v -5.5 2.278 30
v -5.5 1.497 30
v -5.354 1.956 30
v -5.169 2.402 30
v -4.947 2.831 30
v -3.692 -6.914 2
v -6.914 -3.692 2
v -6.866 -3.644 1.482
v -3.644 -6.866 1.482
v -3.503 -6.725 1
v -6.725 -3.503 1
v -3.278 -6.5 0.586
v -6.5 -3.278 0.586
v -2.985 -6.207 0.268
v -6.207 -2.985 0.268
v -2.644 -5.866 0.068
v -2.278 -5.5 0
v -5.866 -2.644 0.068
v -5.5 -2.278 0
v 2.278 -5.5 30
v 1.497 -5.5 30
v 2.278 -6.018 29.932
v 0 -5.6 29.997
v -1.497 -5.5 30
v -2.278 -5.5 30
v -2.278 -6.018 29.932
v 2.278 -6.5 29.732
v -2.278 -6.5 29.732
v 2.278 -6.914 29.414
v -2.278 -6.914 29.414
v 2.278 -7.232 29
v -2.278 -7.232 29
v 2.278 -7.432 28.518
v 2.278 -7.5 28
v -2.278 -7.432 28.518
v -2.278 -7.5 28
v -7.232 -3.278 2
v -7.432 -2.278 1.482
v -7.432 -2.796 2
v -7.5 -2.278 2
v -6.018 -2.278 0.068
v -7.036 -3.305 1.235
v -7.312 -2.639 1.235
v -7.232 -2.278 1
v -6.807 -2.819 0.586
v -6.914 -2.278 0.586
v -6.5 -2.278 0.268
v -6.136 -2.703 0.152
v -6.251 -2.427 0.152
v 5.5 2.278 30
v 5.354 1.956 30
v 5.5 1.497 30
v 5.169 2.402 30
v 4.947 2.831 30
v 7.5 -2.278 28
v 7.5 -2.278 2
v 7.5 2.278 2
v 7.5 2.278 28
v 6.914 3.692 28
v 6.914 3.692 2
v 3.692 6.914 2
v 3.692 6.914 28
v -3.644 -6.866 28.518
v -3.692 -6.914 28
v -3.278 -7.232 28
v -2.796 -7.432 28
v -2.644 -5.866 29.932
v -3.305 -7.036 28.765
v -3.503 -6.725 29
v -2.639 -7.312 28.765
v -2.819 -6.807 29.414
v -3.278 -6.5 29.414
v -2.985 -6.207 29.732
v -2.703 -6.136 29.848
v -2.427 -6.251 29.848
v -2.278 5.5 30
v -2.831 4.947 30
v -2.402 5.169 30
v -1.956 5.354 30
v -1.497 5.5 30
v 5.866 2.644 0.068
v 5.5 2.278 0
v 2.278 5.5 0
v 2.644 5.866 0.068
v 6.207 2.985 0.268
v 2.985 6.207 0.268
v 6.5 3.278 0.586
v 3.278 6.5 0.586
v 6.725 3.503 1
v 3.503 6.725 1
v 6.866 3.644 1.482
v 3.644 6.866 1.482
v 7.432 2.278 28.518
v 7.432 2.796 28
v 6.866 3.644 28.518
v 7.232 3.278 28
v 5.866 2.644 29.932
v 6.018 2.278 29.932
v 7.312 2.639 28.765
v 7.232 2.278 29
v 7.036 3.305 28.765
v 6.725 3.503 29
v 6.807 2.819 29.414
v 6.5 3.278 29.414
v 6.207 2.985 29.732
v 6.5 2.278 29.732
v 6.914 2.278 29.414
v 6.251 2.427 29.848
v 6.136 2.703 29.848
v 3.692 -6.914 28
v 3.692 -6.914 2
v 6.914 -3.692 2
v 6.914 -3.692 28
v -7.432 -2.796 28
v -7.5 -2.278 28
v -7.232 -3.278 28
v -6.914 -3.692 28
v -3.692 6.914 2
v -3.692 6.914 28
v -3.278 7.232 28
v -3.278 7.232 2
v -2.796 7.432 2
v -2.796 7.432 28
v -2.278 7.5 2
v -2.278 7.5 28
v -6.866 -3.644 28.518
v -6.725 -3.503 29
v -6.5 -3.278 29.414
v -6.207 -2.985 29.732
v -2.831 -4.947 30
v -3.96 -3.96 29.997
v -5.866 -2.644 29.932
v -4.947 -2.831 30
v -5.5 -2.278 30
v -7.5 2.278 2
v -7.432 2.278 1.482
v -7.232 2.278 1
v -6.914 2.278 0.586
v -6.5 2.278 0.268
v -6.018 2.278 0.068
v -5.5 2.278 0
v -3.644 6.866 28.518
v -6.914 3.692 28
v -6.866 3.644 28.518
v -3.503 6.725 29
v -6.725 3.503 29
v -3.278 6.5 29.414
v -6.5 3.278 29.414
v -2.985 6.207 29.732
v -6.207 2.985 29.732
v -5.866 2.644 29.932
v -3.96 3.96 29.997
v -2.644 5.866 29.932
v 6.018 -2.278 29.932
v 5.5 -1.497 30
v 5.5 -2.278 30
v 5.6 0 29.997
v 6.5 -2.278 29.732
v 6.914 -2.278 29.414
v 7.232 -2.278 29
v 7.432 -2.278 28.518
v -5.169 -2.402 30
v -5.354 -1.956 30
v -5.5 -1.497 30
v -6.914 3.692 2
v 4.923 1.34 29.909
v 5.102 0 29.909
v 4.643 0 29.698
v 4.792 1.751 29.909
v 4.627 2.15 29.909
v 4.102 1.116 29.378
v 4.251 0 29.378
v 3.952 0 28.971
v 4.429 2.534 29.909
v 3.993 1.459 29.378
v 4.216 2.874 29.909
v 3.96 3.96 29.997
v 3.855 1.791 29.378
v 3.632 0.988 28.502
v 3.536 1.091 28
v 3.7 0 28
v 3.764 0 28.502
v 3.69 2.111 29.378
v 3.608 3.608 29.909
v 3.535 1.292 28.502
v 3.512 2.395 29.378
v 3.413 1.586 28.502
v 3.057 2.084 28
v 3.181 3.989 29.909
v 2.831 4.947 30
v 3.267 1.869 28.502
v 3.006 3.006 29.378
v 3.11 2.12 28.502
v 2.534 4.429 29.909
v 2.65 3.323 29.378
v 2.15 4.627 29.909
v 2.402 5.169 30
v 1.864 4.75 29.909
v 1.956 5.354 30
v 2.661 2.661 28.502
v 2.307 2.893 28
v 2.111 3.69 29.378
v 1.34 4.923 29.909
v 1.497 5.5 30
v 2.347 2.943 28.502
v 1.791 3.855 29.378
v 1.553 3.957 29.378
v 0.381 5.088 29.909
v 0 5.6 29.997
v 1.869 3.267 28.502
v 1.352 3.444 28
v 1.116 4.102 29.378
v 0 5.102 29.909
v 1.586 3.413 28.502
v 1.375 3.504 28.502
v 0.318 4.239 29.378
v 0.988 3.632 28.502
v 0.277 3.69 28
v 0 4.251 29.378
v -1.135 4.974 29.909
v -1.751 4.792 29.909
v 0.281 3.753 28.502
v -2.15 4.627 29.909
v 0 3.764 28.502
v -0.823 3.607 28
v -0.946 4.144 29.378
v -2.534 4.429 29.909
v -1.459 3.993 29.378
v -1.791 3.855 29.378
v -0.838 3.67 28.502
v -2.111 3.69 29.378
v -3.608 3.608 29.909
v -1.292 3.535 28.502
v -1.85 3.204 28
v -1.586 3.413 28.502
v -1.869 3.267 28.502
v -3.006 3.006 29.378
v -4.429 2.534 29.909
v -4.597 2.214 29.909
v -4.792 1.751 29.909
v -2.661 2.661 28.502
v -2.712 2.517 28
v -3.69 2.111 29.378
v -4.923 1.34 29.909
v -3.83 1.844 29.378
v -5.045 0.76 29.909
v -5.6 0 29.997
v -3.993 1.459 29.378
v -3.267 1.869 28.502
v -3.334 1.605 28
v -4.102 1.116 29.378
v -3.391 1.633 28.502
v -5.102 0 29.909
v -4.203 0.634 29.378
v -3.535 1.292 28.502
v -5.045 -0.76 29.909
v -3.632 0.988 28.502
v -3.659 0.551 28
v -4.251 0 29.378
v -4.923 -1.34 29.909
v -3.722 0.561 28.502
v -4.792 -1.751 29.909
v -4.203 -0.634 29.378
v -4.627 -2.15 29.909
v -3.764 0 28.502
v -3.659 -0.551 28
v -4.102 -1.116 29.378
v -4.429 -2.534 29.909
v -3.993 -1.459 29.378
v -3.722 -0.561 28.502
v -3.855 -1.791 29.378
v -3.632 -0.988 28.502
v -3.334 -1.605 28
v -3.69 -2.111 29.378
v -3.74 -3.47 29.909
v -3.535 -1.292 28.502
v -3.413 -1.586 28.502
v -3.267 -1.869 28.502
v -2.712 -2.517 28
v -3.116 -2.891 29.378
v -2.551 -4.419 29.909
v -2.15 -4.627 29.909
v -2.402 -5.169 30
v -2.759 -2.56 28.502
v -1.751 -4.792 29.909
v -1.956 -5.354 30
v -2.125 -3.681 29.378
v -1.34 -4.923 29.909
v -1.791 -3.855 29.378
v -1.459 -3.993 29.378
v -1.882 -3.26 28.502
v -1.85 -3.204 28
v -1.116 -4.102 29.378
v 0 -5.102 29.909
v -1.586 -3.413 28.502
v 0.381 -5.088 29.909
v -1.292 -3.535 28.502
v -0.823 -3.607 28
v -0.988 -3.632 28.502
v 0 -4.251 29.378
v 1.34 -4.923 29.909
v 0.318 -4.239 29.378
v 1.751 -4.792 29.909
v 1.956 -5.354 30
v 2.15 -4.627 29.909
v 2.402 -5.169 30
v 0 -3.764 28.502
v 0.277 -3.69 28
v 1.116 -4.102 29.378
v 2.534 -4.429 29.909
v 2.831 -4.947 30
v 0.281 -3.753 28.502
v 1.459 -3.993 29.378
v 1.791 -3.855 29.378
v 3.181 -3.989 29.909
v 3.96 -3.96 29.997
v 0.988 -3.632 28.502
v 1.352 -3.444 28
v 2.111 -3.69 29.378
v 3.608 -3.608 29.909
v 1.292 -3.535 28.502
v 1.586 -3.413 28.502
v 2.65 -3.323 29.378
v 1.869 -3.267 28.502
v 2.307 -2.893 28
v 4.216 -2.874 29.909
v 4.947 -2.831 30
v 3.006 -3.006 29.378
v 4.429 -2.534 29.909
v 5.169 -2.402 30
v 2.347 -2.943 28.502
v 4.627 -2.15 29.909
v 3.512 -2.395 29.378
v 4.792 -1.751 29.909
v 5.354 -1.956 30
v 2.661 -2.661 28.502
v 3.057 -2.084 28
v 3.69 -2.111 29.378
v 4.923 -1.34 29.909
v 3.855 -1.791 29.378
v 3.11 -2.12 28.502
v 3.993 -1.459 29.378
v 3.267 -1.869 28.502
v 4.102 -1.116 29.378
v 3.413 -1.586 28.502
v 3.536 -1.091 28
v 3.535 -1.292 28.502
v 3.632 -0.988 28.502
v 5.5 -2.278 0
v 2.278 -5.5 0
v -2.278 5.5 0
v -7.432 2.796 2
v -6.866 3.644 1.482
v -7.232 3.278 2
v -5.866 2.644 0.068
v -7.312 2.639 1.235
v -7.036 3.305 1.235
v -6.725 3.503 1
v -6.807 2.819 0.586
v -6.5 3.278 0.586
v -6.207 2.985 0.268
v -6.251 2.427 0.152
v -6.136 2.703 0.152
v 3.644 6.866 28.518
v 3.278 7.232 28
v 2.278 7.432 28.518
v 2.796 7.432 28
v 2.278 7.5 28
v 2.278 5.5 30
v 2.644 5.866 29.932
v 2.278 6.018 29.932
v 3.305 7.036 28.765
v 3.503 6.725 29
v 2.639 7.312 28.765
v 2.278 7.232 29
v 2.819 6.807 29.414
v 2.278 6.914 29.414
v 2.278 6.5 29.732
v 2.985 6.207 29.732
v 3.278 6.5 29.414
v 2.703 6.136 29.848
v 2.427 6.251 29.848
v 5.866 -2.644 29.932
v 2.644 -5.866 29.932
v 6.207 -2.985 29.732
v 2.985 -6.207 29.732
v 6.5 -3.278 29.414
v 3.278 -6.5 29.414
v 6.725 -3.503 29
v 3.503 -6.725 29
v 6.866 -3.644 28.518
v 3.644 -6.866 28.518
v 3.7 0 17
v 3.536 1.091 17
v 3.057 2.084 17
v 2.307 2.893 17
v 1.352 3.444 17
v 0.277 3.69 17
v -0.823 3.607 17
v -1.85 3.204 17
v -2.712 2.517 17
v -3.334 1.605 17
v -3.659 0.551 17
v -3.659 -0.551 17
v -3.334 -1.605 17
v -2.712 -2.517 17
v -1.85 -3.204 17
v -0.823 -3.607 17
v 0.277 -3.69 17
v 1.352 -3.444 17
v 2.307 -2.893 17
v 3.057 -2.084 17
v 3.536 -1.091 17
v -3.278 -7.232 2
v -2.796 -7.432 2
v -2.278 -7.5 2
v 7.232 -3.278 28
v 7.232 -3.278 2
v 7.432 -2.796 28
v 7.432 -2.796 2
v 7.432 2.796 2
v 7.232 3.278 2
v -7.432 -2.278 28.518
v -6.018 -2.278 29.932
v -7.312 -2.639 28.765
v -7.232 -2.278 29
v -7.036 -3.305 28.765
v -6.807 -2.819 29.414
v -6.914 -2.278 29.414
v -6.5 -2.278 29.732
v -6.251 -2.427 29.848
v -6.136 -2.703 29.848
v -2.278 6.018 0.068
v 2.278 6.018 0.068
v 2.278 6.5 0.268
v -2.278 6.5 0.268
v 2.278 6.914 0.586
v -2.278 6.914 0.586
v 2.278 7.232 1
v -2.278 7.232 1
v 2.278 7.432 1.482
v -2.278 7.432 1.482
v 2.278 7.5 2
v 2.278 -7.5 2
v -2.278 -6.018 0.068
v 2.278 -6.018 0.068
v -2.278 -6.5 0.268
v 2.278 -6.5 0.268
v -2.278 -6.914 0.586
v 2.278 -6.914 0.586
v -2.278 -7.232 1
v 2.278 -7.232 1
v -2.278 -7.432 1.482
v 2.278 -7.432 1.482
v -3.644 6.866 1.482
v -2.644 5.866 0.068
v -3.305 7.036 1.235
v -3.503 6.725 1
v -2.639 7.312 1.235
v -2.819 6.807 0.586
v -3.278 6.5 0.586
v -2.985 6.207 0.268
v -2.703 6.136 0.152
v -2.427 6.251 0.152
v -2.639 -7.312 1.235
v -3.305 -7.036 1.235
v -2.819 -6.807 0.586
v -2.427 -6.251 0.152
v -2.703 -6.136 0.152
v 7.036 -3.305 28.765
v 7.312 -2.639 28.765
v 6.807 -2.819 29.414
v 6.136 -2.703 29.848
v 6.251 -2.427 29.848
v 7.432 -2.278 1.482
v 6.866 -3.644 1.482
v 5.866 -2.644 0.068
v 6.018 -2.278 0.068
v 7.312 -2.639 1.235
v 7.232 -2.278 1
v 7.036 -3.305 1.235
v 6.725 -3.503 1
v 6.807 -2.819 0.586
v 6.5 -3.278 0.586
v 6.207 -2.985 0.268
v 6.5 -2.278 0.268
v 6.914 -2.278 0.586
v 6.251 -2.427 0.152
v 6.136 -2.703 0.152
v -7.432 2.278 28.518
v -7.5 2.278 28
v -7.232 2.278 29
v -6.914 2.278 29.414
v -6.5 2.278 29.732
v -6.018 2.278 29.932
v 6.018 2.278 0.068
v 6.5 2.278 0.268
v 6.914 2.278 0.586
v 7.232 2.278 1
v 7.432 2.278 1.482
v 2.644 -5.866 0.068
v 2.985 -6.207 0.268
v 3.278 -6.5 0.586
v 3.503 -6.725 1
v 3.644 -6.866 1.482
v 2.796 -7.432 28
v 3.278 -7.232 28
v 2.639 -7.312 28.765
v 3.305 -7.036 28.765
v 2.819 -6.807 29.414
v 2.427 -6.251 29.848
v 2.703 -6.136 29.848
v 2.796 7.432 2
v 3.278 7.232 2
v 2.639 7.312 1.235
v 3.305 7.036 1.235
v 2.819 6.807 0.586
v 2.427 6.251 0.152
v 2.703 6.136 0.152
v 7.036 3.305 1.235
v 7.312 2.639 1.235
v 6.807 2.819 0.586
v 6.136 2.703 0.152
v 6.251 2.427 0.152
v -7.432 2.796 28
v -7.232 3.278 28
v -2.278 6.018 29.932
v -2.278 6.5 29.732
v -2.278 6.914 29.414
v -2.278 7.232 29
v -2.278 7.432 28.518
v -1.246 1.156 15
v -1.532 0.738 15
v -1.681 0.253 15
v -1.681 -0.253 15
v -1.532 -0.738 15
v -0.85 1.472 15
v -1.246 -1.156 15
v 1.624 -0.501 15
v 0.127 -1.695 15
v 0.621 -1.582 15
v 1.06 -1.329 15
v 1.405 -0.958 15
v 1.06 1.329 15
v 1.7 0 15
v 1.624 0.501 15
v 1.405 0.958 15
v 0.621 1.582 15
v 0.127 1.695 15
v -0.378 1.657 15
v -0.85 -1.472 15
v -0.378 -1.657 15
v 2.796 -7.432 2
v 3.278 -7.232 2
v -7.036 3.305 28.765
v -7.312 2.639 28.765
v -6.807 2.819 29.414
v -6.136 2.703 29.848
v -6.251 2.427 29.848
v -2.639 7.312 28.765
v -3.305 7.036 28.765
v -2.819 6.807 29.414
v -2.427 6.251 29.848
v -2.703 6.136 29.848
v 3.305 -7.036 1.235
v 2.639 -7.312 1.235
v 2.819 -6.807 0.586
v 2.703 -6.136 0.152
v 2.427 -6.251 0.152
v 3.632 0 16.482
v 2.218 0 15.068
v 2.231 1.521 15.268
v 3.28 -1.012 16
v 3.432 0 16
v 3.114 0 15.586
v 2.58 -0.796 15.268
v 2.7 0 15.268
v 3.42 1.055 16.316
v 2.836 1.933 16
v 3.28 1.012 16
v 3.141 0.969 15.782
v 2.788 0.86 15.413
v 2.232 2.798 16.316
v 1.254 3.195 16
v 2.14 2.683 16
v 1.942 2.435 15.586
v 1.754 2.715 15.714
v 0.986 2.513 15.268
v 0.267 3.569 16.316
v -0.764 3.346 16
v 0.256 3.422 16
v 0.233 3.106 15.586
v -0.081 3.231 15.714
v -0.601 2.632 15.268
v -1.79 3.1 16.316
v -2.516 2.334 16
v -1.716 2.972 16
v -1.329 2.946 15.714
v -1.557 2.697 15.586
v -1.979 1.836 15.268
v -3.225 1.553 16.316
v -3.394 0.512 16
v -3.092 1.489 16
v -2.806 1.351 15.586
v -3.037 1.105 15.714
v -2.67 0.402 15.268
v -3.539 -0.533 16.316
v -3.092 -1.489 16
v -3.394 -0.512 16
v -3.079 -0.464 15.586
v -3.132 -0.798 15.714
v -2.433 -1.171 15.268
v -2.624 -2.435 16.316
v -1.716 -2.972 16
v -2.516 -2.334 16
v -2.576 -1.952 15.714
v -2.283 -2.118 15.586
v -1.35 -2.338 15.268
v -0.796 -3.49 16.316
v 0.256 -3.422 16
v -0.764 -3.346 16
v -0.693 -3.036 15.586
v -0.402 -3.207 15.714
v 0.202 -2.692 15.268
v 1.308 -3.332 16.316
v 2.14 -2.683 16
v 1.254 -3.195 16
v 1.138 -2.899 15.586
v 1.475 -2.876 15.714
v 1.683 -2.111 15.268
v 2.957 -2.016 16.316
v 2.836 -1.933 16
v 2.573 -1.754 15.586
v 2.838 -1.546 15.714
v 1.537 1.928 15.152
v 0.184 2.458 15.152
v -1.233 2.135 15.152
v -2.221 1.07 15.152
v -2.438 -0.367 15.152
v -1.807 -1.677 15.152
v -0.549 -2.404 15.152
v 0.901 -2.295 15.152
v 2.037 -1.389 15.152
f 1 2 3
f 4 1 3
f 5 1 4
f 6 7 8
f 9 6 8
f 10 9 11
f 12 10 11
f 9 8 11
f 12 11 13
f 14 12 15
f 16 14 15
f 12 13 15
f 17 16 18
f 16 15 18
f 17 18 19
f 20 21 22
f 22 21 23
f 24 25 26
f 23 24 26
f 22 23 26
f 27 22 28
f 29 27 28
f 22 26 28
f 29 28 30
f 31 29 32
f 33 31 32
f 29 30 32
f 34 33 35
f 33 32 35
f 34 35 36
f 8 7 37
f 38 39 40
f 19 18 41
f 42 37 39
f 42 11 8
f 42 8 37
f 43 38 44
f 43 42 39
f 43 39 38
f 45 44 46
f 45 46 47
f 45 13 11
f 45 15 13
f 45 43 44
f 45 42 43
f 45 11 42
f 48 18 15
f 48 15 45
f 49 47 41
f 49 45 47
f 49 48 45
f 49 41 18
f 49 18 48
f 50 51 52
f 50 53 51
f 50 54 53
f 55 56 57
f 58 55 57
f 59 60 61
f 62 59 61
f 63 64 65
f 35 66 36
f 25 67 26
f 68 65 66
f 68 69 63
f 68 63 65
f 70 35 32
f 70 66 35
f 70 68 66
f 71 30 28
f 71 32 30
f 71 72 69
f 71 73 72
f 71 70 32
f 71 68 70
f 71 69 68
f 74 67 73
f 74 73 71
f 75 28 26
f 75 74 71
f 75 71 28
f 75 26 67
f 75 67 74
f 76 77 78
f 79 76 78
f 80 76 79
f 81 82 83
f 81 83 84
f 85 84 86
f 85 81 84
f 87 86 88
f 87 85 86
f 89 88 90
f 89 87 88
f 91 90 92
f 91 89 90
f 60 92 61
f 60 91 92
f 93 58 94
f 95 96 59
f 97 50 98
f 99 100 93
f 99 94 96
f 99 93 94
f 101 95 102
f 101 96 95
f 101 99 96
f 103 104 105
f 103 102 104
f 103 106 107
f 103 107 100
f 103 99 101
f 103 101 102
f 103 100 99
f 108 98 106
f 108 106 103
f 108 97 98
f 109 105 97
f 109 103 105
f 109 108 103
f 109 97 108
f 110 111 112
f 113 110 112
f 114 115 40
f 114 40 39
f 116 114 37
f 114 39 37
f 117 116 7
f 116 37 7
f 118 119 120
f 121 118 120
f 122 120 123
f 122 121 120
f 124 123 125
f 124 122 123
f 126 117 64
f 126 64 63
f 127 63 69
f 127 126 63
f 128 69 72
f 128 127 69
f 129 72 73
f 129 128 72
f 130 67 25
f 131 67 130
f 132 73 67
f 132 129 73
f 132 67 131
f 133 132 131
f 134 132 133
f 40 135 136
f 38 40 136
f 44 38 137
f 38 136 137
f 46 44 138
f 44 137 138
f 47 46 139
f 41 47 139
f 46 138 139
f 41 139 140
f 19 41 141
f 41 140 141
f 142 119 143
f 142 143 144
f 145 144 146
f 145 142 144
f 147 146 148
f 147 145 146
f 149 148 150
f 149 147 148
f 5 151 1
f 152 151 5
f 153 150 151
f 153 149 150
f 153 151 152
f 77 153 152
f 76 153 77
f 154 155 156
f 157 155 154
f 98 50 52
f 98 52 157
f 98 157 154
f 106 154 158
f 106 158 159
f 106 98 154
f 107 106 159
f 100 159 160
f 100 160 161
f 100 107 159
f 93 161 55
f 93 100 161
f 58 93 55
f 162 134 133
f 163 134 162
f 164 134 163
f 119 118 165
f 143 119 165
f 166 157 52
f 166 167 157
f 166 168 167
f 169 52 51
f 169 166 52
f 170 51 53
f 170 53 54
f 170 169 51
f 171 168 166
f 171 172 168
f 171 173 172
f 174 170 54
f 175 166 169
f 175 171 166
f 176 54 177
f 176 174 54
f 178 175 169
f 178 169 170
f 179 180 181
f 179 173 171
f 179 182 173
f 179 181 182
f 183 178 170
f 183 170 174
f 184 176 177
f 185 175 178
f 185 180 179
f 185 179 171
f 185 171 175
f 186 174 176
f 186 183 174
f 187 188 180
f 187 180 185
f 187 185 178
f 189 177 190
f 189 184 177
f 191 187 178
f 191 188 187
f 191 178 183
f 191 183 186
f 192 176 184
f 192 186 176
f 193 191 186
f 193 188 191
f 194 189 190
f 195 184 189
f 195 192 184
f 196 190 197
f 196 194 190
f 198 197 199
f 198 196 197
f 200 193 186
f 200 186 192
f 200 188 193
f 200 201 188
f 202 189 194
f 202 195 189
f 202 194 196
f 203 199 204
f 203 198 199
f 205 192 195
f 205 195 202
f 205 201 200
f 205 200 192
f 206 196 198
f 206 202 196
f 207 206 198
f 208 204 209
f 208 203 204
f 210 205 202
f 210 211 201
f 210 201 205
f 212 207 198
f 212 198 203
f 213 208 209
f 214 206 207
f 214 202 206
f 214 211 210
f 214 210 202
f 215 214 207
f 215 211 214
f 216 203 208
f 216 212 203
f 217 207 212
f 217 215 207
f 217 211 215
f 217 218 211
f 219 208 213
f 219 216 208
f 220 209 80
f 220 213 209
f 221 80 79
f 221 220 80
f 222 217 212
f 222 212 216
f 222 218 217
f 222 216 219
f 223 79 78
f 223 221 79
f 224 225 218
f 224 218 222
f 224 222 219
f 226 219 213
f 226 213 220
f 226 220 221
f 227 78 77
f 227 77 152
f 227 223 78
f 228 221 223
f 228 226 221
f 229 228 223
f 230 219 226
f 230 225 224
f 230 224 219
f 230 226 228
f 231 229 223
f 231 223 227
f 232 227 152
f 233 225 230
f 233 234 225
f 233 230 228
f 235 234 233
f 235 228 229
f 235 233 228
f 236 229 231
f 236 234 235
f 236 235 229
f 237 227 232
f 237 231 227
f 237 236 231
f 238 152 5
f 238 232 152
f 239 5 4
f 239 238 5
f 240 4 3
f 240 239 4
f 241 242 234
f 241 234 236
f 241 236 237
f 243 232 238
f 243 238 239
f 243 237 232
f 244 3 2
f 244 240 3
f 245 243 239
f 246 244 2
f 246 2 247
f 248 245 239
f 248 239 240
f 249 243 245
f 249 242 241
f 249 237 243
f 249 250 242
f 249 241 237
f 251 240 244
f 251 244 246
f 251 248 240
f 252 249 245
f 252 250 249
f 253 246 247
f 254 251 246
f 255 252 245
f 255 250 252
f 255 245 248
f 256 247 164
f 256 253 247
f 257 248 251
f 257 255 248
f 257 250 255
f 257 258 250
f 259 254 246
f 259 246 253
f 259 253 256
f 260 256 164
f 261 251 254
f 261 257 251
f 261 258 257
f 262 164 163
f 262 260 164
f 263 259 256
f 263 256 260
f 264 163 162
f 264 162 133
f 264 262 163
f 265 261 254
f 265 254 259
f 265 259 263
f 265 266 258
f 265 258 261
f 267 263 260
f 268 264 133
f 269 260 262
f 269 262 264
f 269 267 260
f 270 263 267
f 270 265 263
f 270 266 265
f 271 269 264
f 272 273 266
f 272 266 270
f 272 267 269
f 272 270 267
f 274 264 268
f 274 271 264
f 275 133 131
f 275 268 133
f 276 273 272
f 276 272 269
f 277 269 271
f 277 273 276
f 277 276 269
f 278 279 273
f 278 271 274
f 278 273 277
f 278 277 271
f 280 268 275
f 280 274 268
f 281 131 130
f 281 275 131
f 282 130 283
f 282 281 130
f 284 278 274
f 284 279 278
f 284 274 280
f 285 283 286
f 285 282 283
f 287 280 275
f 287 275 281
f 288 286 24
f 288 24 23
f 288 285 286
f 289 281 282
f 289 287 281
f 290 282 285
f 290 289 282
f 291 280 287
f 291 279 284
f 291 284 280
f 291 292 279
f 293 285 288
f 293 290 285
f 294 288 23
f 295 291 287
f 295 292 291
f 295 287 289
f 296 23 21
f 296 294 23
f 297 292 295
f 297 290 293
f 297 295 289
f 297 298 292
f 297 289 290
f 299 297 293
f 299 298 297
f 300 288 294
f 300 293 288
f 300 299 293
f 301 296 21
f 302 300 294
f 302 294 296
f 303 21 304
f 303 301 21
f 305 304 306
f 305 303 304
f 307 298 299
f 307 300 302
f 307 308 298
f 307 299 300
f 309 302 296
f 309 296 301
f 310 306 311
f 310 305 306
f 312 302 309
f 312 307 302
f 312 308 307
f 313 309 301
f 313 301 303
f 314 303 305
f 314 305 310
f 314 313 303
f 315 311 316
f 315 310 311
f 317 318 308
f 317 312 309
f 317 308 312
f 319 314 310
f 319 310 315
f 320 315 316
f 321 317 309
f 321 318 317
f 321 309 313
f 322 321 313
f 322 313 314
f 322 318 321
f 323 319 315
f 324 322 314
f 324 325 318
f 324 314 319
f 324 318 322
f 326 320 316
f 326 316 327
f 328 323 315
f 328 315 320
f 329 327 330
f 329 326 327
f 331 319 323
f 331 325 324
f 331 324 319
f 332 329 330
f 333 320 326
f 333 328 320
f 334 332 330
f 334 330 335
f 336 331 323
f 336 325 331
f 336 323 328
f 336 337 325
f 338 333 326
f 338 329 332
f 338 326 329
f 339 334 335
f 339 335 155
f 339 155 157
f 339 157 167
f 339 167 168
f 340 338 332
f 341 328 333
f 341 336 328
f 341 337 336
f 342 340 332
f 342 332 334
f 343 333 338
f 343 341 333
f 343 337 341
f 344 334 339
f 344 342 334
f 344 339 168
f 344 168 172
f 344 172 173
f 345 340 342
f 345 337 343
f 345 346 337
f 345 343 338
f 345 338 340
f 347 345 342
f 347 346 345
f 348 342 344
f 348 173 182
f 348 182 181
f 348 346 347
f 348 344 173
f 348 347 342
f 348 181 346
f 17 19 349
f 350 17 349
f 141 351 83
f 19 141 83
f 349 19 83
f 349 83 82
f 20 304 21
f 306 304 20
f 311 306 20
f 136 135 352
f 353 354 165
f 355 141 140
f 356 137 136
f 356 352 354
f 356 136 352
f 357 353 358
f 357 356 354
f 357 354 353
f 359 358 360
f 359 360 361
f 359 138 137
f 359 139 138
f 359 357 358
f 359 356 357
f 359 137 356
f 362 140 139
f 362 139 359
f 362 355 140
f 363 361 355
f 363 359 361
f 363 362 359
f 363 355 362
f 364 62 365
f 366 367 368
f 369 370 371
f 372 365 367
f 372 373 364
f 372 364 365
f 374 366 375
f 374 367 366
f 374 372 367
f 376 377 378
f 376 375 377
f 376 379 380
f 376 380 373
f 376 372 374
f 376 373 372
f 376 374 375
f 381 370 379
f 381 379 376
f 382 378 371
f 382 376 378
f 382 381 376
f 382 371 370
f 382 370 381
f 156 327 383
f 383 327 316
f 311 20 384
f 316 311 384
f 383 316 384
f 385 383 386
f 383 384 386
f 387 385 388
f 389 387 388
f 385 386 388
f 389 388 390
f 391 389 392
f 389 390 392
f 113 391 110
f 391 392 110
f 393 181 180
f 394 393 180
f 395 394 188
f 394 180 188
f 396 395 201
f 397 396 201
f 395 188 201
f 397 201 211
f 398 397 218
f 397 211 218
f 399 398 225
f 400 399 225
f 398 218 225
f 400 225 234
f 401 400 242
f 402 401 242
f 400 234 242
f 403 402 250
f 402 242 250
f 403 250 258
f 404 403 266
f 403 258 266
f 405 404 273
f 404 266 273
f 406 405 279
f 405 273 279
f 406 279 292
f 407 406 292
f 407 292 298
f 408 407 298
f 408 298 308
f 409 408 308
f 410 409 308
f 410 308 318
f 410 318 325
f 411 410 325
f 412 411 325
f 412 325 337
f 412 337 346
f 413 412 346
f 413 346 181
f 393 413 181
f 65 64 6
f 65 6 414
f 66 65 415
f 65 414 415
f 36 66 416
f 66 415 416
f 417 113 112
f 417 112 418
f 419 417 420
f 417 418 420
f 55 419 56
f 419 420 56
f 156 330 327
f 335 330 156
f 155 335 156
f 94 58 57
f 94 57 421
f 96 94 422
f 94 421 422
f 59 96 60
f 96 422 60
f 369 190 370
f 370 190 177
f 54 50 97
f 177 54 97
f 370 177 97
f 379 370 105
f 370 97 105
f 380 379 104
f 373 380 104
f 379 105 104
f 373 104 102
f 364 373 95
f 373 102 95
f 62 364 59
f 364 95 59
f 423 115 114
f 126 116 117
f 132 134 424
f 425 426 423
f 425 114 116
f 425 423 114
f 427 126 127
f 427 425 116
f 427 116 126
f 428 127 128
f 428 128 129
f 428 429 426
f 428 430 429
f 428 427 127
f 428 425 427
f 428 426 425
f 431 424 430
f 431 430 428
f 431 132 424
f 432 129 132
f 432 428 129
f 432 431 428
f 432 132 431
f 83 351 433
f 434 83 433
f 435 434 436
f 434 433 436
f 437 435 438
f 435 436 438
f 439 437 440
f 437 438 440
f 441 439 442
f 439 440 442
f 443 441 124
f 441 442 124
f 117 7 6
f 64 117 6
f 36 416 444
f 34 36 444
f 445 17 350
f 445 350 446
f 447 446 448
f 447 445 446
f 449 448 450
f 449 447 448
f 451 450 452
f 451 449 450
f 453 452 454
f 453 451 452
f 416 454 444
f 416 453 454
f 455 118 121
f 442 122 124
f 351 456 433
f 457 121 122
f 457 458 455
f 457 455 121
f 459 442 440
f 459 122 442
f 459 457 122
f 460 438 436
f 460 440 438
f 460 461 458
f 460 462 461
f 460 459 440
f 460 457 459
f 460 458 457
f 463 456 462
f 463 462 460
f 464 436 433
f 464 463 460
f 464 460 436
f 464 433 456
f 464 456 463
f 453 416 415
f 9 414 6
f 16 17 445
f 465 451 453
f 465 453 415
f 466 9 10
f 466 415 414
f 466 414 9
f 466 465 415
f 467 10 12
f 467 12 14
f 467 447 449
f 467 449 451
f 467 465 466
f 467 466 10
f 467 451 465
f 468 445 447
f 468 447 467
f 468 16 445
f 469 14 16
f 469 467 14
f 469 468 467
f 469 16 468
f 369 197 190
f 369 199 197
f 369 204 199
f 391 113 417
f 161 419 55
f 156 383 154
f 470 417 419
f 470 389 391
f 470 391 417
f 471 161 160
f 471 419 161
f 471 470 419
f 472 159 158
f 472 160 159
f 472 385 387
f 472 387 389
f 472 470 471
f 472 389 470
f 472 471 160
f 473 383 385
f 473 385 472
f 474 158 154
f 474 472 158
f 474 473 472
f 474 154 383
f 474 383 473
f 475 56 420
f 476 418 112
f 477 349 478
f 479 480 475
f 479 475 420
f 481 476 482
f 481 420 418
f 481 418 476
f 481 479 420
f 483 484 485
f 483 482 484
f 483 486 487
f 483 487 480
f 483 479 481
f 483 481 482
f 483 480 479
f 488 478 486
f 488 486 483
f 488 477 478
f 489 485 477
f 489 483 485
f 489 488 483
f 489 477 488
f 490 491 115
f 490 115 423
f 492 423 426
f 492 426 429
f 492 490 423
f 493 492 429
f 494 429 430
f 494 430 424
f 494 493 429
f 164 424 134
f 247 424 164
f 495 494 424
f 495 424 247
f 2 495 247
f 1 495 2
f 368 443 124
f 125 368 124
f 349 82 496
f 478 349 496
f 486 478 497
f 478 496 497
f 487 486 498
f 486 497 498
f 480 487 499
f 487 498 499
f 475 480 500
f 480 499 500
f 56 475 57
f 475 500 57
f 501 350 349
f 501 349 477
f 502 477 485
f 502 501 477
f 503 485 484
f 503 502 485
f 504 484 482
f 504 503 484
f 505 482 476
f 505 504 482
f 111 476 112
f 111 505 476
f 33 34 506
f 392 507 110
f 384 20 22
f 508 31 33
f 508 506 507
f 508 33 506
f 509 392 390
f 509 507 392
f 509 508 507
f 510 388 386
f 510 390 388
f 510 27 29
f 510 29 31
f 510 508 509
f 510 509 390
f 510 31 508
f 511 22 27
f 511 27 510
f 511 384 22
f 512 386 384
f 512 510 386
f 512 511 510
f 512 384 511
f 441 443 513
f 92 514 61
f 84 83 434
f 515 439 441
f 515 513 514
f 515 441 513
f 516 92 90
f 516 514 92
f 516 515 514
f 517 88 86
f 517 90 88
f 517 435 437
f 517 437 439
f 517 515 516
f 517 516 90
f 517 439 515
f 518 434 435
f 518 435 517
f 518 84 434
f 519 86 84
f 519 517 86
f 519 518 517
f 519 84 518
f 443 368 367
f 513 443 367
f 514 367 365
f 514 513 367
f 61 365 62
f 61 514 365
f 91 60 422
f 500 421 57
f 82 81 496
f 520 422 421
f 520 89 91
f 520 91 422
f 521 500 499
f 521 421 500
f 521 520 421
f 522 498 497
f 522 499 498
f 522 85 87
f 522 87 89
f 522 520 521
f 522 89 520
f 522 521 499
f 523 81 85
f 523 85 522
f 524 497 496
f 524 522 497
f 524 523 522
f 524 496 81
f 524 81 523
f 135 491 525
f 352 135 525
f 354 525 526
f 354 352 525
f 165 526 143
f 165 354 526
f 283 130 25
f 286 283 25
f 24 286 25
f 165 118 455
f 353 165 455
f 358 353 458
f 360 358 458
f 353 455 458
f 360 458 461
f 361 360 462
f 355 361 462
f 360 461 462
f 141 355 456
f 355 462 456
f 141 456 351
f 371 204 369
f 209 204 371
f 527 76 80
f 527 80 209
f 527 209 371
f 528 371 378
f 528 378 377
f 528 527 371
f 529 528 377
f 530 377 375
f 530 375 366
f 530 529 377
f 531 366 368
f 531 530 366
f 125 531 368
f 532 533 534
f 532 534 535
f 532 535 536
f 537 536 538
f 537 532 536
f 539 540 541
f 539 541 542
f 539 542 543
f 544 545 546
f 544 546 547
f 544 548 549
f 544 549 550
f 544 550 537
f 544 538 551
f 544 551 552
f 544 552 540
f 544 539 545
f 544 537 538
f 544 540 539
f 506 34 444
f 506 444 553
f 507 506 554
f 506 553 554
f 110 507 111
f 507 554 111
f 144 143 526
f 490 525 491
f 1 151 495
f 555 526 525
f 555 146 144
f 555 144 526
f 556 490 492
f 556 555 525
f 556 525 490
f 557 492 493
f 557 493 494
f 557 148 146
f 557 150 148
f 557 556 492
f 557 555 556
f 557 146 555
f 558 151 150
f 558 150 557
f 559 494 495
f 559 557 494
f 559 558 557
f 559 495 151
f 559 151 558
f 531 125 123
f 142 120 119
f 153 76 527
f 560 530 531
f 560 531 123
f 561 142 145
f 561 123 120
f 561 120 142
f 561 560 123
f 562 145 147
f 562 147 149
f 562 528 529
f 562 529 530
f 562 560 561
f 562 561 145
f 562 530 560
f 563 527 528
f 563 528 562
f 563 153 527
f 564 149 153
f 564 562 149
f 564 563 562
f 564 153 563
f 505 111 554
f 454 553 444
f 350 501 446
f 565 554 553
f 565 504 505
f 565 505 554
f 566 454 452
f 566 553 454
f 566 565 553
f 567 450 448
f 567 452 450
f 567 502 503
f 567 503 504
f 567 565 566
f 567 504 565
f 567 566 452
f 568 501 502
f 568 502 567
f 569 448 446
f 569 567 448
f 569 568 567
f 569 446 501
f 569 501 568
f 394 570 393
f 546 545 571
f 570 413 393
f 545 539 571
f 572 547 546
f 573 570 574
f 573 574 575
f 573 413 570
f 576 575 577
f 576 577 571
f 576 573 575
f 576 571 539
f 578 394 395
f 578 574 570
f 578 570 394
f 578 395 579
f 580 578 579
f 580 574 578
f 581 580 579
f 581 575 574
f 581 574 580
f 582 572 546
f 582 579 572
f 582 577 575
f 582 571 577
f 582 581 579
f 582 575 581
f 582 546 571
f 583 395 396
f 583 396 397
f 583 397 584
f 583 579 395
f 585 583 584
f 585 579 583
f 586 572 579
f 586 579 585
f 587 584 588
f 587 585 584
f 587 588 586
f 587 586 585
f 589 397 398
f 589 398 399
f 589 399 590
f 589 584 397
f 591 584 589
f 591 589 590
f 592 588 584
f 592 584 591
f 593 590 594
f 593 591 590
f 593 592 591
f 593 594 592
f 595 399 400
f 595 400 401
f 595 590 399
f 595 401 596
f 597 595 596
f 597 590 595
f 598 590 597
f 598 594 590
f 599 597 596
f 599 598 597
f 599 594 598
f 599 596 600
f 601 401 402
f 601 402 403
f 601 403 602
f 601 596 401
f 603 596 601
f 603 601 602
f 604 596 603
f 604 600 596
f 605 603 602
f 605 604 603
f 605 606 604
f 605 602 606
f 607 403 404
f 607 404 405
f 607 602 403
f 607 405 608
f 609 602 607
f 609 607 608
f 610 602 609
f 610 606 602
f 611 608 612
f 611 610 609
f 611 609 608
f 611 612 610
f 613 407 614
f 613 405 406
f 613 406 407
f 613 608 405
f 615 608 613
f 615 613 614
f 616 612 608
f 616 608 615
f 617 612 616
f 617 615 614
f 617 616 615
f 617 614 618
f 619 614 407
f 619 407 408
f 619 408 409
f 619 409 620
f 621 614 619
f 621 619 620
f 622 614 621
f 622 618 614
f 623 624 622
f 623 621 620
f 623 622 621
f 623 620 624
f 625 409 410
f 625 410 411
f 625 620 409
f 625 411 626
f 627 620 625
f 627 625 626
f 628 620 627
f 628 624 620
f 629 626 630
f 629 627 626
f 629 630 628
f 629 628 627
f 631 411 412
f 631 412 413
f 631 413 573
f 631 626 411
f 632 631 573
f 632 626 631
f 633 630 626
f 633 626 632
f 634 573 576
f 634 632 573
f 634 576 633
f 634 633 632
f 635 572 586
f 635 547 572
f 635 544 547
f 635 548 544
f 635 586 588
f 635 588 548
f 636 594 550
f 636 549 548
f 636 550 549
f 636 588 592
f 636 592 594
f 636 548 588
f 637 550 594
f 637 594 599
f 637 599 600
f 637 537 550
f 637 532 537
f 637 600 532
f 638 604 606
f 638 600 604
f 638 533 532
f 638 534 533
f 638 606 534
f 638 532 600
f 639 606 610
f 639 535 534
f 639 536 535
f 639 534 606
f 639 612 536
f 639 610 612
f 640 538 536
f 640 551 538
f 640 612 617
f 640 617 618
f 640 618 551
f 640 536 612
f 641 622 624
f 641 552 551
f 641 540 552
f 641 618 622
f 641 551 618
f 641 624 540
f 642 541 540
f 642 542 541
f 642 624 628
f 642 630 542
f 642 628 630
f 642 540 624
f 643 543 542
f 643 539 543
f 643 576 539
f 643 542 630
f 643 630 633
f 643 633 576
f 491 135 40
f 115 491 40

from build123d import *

# Parameters (mm, degrees)
F1_DEPTH      = 30
F2_R          = 3.7
F3_DEPTH      = 15
F4_T3_DEPTH   = 4.5563491861
F4_T5_DEPTH   = 26
F4_T7_DEPTH   = 4.5563491861
F4_T9_DEPTH   = 4.5563491861
F4_T11_DEPTH  = 4.5563491861
F4_T13_DEPTH  = 4.5563491861
F4_T15_DEPTH  = 4.5563491861
F4_T20_DEPTH  = 2
F4_T26_DEPTH  = 2
F4_T32_DEPTH  = 2
F4_T38_DEPTH  = 2
F4_T44_DEPTH  = 2
F4_T50_DEPTH  = 2
F4_T56_DEPTH  = 2
F4_T62_DEPTH  = 2
F4_T68_DEPTH  = 2
F4_T74_DEPTH  = 2
F4_T80_DEPTH  = 2
F4_T86_DEPTH  = 2
F4_T92_DEPTH  = 2
F4_T98_DEPTH  = 2
F4_T104_DEPTH = 2
F4_T110_DEPTH = 2


# Not quite as in the source:
# - a fillet or chamfer that OpenCascade refuses, or shapes differently, is made with other operations: its cross-section is extruded or revolved along the edge and cut away or added


with BuildPart() as f1:
    # F0 (on Top) → F1 (new body)
    with BuildSketch(Plane.XY):
        Polygon((-7.5, 3.1066017178), (-7.5, -3.1066017178), (-3.1066017178, -7.5), (3.1066017178, -7.5), (7.5, -3.1066017178), (7.5, 3.1066017178), (3.1066017178, 7.5), (-3.1066017178, 7.5), align=None)
    extrude(amount=F1_DEPTH)

    # F2 (on face) → F3 (cut)
    with BuildSketch(Plane.XY.offset(30)):
        Circle(F2_R)
    extrude(amount=-F3_DEPTH, mode=Mode.SUBTRACT)

    # F4: fillet of radius 2 on 26 edges, made by hand

    # F4_s1 → F4_t2 (revolve)
    with BuildSketch(Plane.XZ):
        with BuildLine():
            ThreePointArc((3.7, 17), (3.1142135624, 15.5857864376), (1.7, 15))
            Line((1.7, 15), (3.7, 15))
            Line((3.7, 15), (3.7, 17))
        make_face()
    revolve(axis=Axis((0, 0, 15), (0, 0, 1)))

    # F4_s4 → F4_t3 (cut)
    with BuildSketch(Plane(origin=(-1.6109127035, -1.6109127035, 0), x_dir=(0, 0, 1), z_dir=(0.7071067812, 0.7071067812, 0))):
        with BuildLine():
            ThreePointArc((0, 5.5), (0.5857864376, 6.9142135624), (2, 7.5))
            Line((2, 7.5), (0, 7.5))
            Line((0, 7.5), (0, 5.5))
        make_face()
        with BuildLine():
            ThreePointArc((30, 5.5), (29.4142135624, 6.9142135624), (28, 7.5))
            Line((28, 7.5), (30, 7.5))
            Line((30, 7.5), (30, 5.5))
        make_face()
    extrude(amount=F4_T3_DEPTH, mode=Mode.SUBTRACT)

    # F4_s6 → F4_t5 (cut)
    with BuildSketch(Plane.XY.offset(2)):
        with BuildLine():
            ThreePointArc((6.9142135624, -3.6923881554), (7.347759065, -3.0435414578), (7.5, -2.2781745931))
            Line((7.5, -2.2781745931), (7.5, -3.1066017178))
            Line((7.5, -3.1066017178), (6.9142135624, -3.6923881554))
        make_face()
        with BuildLine():
            ThreePointArc((7.5, 2.2781745931), (7.347759065, 3.0435414578), (6.9142135624, 3.6923881554))
            Line((6.9142135624, 3.6923881554), (7.5, 3.1066017178))
            Line((7.5, 3.1066017178), (7.5, 2.2781745931))
        make_face()
        with BuildLine():
            ThreePointArc((-7.5, 2.2781745931), (-7.347759065, 3.0435414578), (-6.9142135624, 3.6923881554))
            Line((-6.9142135624, 3.6923881554), (-7.5, 3.1066017178))
            Line((-7.5, 3.1066017178), (-7.5, 2.2781745931))
        make_face()
        with BuildLine():
            ThreePointArc((-3.6923881554, 6.9142135624), (-3.0435414578, 7.347759065), (-2.2781745931, 7.5))
            Line((-2.2781745931, 7.5), (-3.1066017178, 7.5))
            Line((-3.1066017178, 7.5), (-3.6923881554, 6.9142135624))
        make_face()
        with BuildLine():
            ThreePointArc((-3.6923881554, -6.9142135624), (-3.0435414578, -7.347759065), (-2.2781745931, -7.5))
            Line((-2.2781745931, -7.5), (-3.1066017178, -7.5))
            Line((-3.1066017178, -7.5), (-3.6923881554, -6.9142135624))
        make_face()
        with BuildLine():
            ThreePointArc((-7.5, -2.2781745931), (-7.347759065, -3.0435414578), (-6.9142135624, -3.6923881554))
            Line((-6.9142135624, -3.6923881554), (-7.5, -3.1066017178))
            Line((-7.5, -3.1066017178), (-7.5, -2.2781745931))
        make_face()
        with BuildLine():
            ThreePointArc((2.2781745931, -7.5), (3.0435414578, -7.347759065), (3.6923881554, -6.9142135624))
            Line((3.6923881554, -6.9142135624), (3.1066017178, -7.5))
            Line((3.1066017178, -7.5), (2.2781745931, -7.5))
        make_face()
        with BuildLine():
            ThreePointArc((2.2781745931, 7.5), (3.0435414578, 7.347759065), (3.6923881554, 6.9142135624))
            Line((3.6923881554, 6.9142135624), (3.1066017178, 7.5))
            Line((3.1066017178, 7.5), (2.2781745931, 7.5))
        make_face()
    extrude(amount=F4_T5_DEPTH, mode=Mode.SUBTRACT)

    # F4_s8 → F4_t7 (cut)
    with BuildSketch(Plane.YZ.offset(-2.2781745931)):
        with BuildLine():
            ThreePointArc((-5.5, 0), (-6.9142135624, 0.5857864376), (-7.5, 2))
            Line((-7.5, 2), (-7.5, 0))
            Line((-7.5, 0), (-5.5, 0))
        make_face()
        with BuildLine():
            ThreePointArc((5.5, 0), (6.9142135624, 0.5857864376), (7.5, 2))
            Line((7.5, 2), (7.5, 0))
            Line((7.5, 0), (5.5, 0))
        make_face()
        with BuildLine():
            ThreePointArc((-5.5, 30), (-6.9142135624, 29.4142135624), (-7.5, 28))
            Line((-7.5, 28), (-7.5, 30))
            Line((-7.5, 30), (-5.5, 30))
        make_face()
        with BuildLine():
            ThreePointArc((5.5, 30), (6.9142135624, 29.4142135624), (7.5, 28))
            Line((7.5, 28), (7.5, 30))
            Line((7.5, 30), (5.5, 30))
        make_face()
    extrude(amount=F4_T7_DEPTH, mode=Mode.SUBTRACT)

    # F4_s10 → F4_t9 (cut)
    with BuildSketch(Plane.XZ.offset(-2.2781745931)):
        with BuildLine():
            ThreePointArc((5.5, 30), (6.9142135624, 29.4142135624), (7.5, 28))
            Line((7.5, 28), (7.5, 30))
            Line((7.5, 30), (5.5, 30))
        make_face()
        with BuildLine():
            ThreePointArc((5.5, 0), (6.9142135624, 0.5857864376), (7.5, 2))
            Line((7.5, 2), (7.5, 0))
            Line((7.5, 0), (5.5, 0))
        make_face()
        with BuildLine():
            ThreePointArc((-7.5, 2), (-6.9142135624, 0.5857864376), (-5.5, 0))
            Line((-5.5, 0), (-7.5, 0))
            Line((-7.5, 0), (-7.5, 2))
        make_face()
        with BuildLine():
            ThreePointArc((-7.5, 28), (-6.9142135624, 29.4142135624), (-5.5, 30))
            Line((-5.5, 30), (-7.5, 30))
            Line((-7.5, 30), (-7.5, 28))
        make_face()
    extrude(amount=F4_T9_DEPTH, mode=Mode.SUBTRACT)

    # F4_s12 → F4_t11 (cut)
    with BuildSketch(Plane(origin=(1.6109127035, -1.6109127035, 0), x_dir=(0, 0, 1), z_dir=(-0.7071067812, 0.7071067812, 0))):
        with BuildLine():
            ThreePointArc((0, 5.5), (0.5857864376, 6.9142135624), (2, 7.5))
            Line((2, 7.5), (0, 7.5))
            Line((0, 7.5), (0, 5.5))
        make_face()
        with BuildLine():
            ThreePointArc((30, 5.5), (29.4142135624, 6.9142135624), (28, 7.5))
            Line((28, 7.5), (30, 7.5))
            Line((30, 7.5), (30, 5.5))
        make_face()
    extrude(amount=F4_T11_DEPTH, mode=Mode.SUBTRACT)

    # F4_s14 → F4_t13 (cut)
    with BuildSketch(Plane(origin=(-1.6109127035, 1.6109127035, 0), x_dir=(0, 0, 1), z_dir=(0.7071067812, -0.7071067812, 0))):
        with BuildLine():
            ThreePointArc((2, 7.5), (0.5857864376, 6.9142135624), (0, 5.5))
            Line((0, 5.5), (0, 7.5))
            Line((0, 7.5), (2, 7.5))
        make_face()
        with BuildLine():
            ThreePointArc((28, 7.5), (29.4142135624, 6.9142135624), (30, 5.5))
            Line((30, 5.5), (30, 7.5))
            Line((30, 7.5), (28, 7.5))
        make_face()
    extrude(amount=F4_T13_DEPTH, mode=Mode.SUBTRACT)

    # F4_s16 → F4_t15 (cut)
    with BuildSketch(Plane(origin=(1.6109127035, 1.6109127035, 0), x_dir=(0, 0, 1), z_dir=(-0.7071067812, -0.7071067812, 0))):
        with BuildLine():
            ThreePointArc((28, 7.5), (29.4142135624, 6.9142135624), (30, 5.5))
            Line((30, 5.5), (30, 7.5))
            Line((30, 7.5), (28, 7.5))
        make_face()
        with BuildLine():
            ThreePointArc((2, 7.5), (0.5857864376, 6.9142135624), (0, 5.5))
            Line((0, 5.5), (0, 7.5))
            Line((0, 7.5), (2, 7.5))
        make_face()
    extrude(amount=F4_T15_DEPTH, mode=Mode.SUBTRACT)


with BuildPart() as f4_tool18:
    # F4_s19 → F4_t20 (new body)
    with BuildSketch(Plane.XY.offset(2)):
        Polygon((2.2781745931, -5.5), (2.2781745931, -7.5), (3.1066017178, -7.5), (3.6923881554, -6.9142135624), align=None)
    extrude(amount=-F4_T20_DEPTH)

    # F4_s21 → F4_t22 (revolve, cut)
    with BuildSketch(Plane(origin=(2.2781745931, -5.5, 2), x_dir=(-0.3826834324, 0.9238795325, 0), z_dir=(-0.9238795325, -0.3826834324, 0))):
        with BuildLine():
            ThreePointArc((0, -2), (2, 0), (0, 2))
            Line((0, 2), (0, -2))
        make_face()
    revolve(axis=Axis((2.2781745931, -5.5, 2), (0, 0, -1)), mode=Mode.SUBTRACT)


with BuildPart() as f1_1:
    add(f1.part)

    # F4_t17: cut F4_tool18
    add(f4_tool18.part, mode=Mode.SUBTRACT)


with BuildPart() as f4_tool24:
    # F4_s25 → F4_t26 (new body)
    with BuildSketch(Plane.XY.offset(2)):
        Polygon((5.5, -2.2781745931), (6.9142135624, -3.6923881554), (7.5, -3.1066017178), (7.5, -2.2781745931), align=None)
    extrude(amount=-F4_T26_DEPTH)

    # F4_s27 → F4_t28 (revolve, cut)
    with BuildSketch(Plane(origin=(5.5, -2.2781745931, 2), x_dir=(-0.9238795325, 0.3826834324, 0), z_dir=(-0.3826834324, -0.9238795325, 0))):
        with BuildLine():
            ThreePointArc((0, -2), (2, 0), (0, 2))
            Line((0, 2), (0, -2))
        make_face()
    revolve(axis=Axis((5.5, -2.2781745931, 2), (0, 0, -1)), mode=Mode.SUBTRACT)


with BuildPart() as f1_2:
    add(f1_1.part)

    # F4_t23: cut F4_tool24
    add(f4_tool24.part, mode=Mode.SUBTRACT)


with BuildPart() as f4_tool30:
    # F4_s31 → F4_t32 (new body)
    with BuildSketch(Plane.XY.offset(28)):
        Polygon((5.5, -2.2781745931), (6.9142135624, -3.6923881554), (7.5, -3.1066017178), (7.5, -2.2781745931), align=None)
    extrude(amount=F4_T32_DEPTH)

    # F4_s33 → F4_t34 (revolve, cut)
    with BuildSketch(Plane(origin=(5.5, -2.2781745931, 28), x_dir=(-0.9238795325, 0.3826834324, 0), z_dir=(0.3826834324, 0.9238795325, 0))):
        with BuildLine():
            ThreePointArc((0, -2), (2, 0), (0, 2))
            Line((0, 2), (0, -2))
        make_face()
    revolve(axis=Axis((5.5, -2.2781745931, 28), (0, 0, 1)), mode=Mode.SUBTRACT)


with BuildPart() as f1_3:
    add(f1_2.part)

    # F4_t29: cut F4_tool30
    add(f4_tool30.part, mode=Mode.SUBTRACT)


with BuildPart() as f4_tool36:
    # F4_s37 → F4_t38 (new body)
    with BuildSketch(Plane.XY.offset(2)):
        Polygon((5.5, 2.2781745931), (7.5, 2.2781745931), (7.5, 3.1066017178), (6.9142135624, 3.6923881554), align=None)
    extrude(amount=-F4_T38_DEPTH)

    # F4_s39 → F4_t40 (revolve, cut)
    with BuildSketch(Plane(origin=(5.5, 2.2781745931, 2), x_dir=(-0.9238795325, -0.3826834324, 0), z_dir=(0.3826834324, -0.9238795325, 0))):
        with BuildLine():
            ThreePointArc((0, -2), (2, 0), (0, 2))
            Line((0, 2), (0, -2))
        make_face()
    revolve(axis=Axis((5.5, 2.2781745931, 2), (0, 0, -1)), mode=Mode.SUBTRACT)


with BuildPart() as f1_4:
    add(f1_3.part)

    # F4_t35: cut F4_tool36
    add(f4_tool36.part, mode=Mode.SUBTRACT)


with BuildPart() as f4_tool42:
    # F4_s43 → F4_t44 (new body)
    with BuildSketch(Plane.XY.offset(28)):
        Polygon((5.5, 2.2781745931), (7.5, 2.2781745931), (7.5, 3.1066017178), (6.9142135624, 3.6923881554), align=None)
    extrude(amount=F4_T44_DEPTH)

    # F4_s45 → F4_t46 (revolve, cut)
    with BuildSketch(Plane(origin=(5.5, 2.2781745931, 28), x_dir=(-0.9238795325, -0.3826834324, 0), z_dir=(-0.3826834324, 0.9238795325, 0))):
        with BuildLine():
            ThreePointArc((0, -2), (2, 0), (0, 2))
            Line((0, 2), (0, -2))
        make_face()
    revolve(axis=Axis((5.5, 2.2781745931, 28), (0, 0, 1)), mode=Mode.SUBTRACT)


with BuildPart() as f1_5:
    add(f1_4.part)

    # F4_t41: cut F4_tool42
    add(f4_tool42.part, mode=Mode.SUBTRACT)


with BuildPart() as f4_tool48:
    # F4_s49 → F4_t50 (new body)
    with BuildSketch(Plane.XY.offset(2)):
        Polygon((-2.2781745931, -5.5), (-2.2781745931, -7.5), (-3.1066017178, -7.5), (-3.6923881554, -6.9142135624), align=None)
    extrude(amount=-F4_T50_DEPTH)

    # F4_s51 → F4_t52 (revolve, cut)
    with BuildSketch(Plane(origin=(-2.2781745931, -5.5, 2), x_dir=(0.3826834324, 0.9238795325, 0), z_dir=(-0.9238795325, 0.3826834324, 0))):
        with BuildLine():
            ThreePointArc((0, -2), (2, 0), (0, 2))
            Line((0, 2), (0, -2))
        make_face()
    revolve(axis=Axis((-2.2781745931, -5.5, 2), (0, 0, -1)), mode=Mode.SUBTRACT)


with BuildPart() as f1_6:
    add(f1_5.part)

    # F4_t47: cut F4_tool48
    add(f4_tool48.part, mode=Mode.SUBTRACT)


with BuildPart() as f4_tool54:
    # F4_s55 → F4_t56 (new body)
    with BuildSketch(Plane.XY.offset(2)):
        Polygon((2.2781745931, 5.5), (2.2781745931, 7.5), (3.1066017178, 7.5), (3.6923881554, 6.9142135624), align=None)
    extrude(amount=-F4_T56_DEPTH)

    # F4_s57 → F4_t58 (revolve, cut)
    with BuildSketch(Plane(origin=(2.2781745931, 5.5, 2), x_dir=(-0.3826834324, -0.9238795325, 0), z_dir=(0.9238795325, -0.3826834324, 0))):
        with BuildLine():
            ThreePointArc((0, -2), (2, 0), (0, 2))
            Line((0, 2), (0, -2))
        make_face()
    revolve(axis=Axis((2.2781745931, 5.5, 2), (0, 0, -1)), mode=Mode.SUBTRACT)


with BuildPart() as f1_7:
    add(f1_6.part)

    # F4_t53: cut F4_tool54
    add(f4_tool54.part, mode=Mode.SUBTRACT)


with BuildPart() as f4_tool60:
    # F4_s61 → F4_t62 (new body)
    with BuildSketch(Plane.XY.offset(2)):
        Polygon((-2.2781745931, 5.5), (-2.2781745931, 7.5), (-3.1066017178, 7.5), (-3.6923881554, 6.9142135624), align=None)
    extrude(amount=-F4_T62_DEPTH)

    # F4_s63 → F4_t64 (revolve, cut)
    with BuildSketch(Plane(origin=(-2.2781745931, 5.5, 2), x_dir=(0.3826834324, -0.9238795325, 0), z_dir=(0.9238795325, 0.3826834324, 0))):
        with BuildLine():
            ThreePointArc((0, -2), (2, 0), (0, 2))
            Line((0, 2), (0, -2))
        make_face()
    revolve(axis=Axis((-2.2781745931, 5.5, 2), (0, 0, -1)), mode=Mode.SUBTRACT)


with BuildPart() as f1_8:
    add(f1_7.part)

    # F4_t59: cut F4_tool60
    add(f4_tool60.part, mode=Mode.SUBTRACT)


with BuildPart() as f4_tool66:
    # F4_s67 → F4_t68 (new body)
    with BuildSketch(Plane.XY.offset(2)):
        Polygon((-5.5, -2.2781745931), (-7.5, -2.2781745931), (-7.5, -3.1066017178), (-6.9142135624, -3.6923881554), align=None)
    extrude(amount=-F4_T68_DEPTH)

    # F4_s69 → F4_t70 (revolve, cut)
    with BuildSketch(Plane(origin=(-5.5, -2.2781745931, 2), x_dir=(0.9238795325, 0.3826834324, 0), z_dir=(-0.3826834324, 0.9238795325, 0))):
        with BuildLine():
            ThreePointArc((0, -2), (2, 0), (0, 2))
            Line((0, 2), (0, -2))
        make_face()
    revolve(axis=Axis((-5.5, -2.2781745931, 2), (0, 0, -1)), mode=Mode.SUBTRACT)


with BuildPart() as f1_9:
    add(f1_8.part)

    # F4_t65: cut F4_tool66
    add(f4_tool66.part, mode=Mode.SUBTRACT)


with BuildPart() as f4_tool72:
    # F4_s73 → F4_t74 (new body)
    with BuildSketch(Plane.XY.offset(2)):
        Polygon((-5.5, 2.2781745931), (-7.5, 2.2781745931), (-7.5, 3.1066017178), (-6.9142135624, 3.6923881554), align=None)
    extrude(amount=-F4_T74_DEPTH)

    # F4_s75 → F4_t76 (revolve, cut)
    with BuildSketch(Plane(origin=(-5.5, 2.2781745931, 2), x_dir=(0.9238795325, -0.3826834324, 0), z_dir=(0.3826834324, 0.9238795325, 0))):
        with BuildLine():
            ThreePointArc((0, -2), (2, 0), (0, 2))
            Line((0, 2), (0, -2))
        make_face()
    revolve(axis=Axis((-5.5, 2.2781745931, 2), (0, 0, -1)), mode=Mode.SUBTRACT)


with BuildPart() as f1_10:
    add(f1_9.part)

    # F4_t71: cut F4_tool72
    add(f4_tool72.part, mode=Mode.SUBTRACT)


with BuildPart() as f4_tool78:
    # F4_s79 → F4_t80 (new body)
    with BuildSketch(Plane.XY.offset(28)):
        Polygon((-5.5, 2.2781745931), (-7.5, 2.2781745931), (-7.5, 3.1066017178), (-6.9142135624, 3.6923881554), align=None)
    extrude(amount=F4_T80_DEPTH)

    # F4_s81 → F4_t82 (revolve, cut)
    with BuildSketch(Plane(origin=(-5.5, 2.2781745931, 28), x_dir=(0.9238795325, -0.3826834324, 0), z_dir=(-0.3826834324, -0.9238795325, 0))):
        with BuildLine():
            ThreePointArc((0, -2), (2, 0), (0, 2))
            Line((0, 2), (0, -2))
        make_face()
    revolve(axis=Axis((-5.5, 2.2781745931, 28), (0, 0, 1)), mode=Mode.SUBTRACT)


with BuildPart() as f1_11:
    add(f1_10.part)

    # F4_t77: cut F4_tool78
    add(f4_tool78.part, mode=Mode.SUBTRACT)


with BuildPart() as f4_tool84:
    # F4_s85 → F4_t86 (new body)
    with BuildSketch(Plane.XY.offset(28)):
        Polygon((-2.2781745931, 5.5), (-2.2781745931, 7.5), (-3.1066017178, 7.5), (-3.6923881554, 6.9142135624), align=None)
    extrude(amount=F4_T86_DEPTH)

    # F4_s87 → F4_t88 (revolve, cut)
    with BuildSketch(Plane(origin=(-2.2781745931, 5.5, 28), x_dir=(0.3826834324, -0.9238795325, 0), z_dir=(-0.9238795325, -0.3826834324, 0))):
        with BuildLine():
            ThreePointArc((0, -2), (2, 0), (0, 2))
            Line((0, 2), (0, -2))
        make_face()
    revolve(axis=Axis((-2.2781745931, 5.5, 28), (0, 0, 1)), mode=Mode.SUBTRACT)


with BuildPart() as f1_12:
    add(f1_11.part)

    # F4_t83: cut F4_tool84
    add(f4_tool84.part, mode=Mode.SUBTRACT)


with BuildPart() as f4_tool90:
    # F4_s91 → F4_t92 (new body)
    with BuildSketch(Plane.XY.offset(28)):
        Polygon((-2.2781745931, -5.5), (-2.2781745931, -7.5), (-3.1066017178, -7.5), (-3.6923881554, -6.9142135624), align=None)
    extrude(amount=F4_T92_DEPTH)

    # F4_s93 → F4_t94 (revolve, cut)
    with BuildSketch(Plane(origin=(-2.2781745931, -5.5, 28), x_dir=(0.3826834324, 0.9238795325, 0), z_dir=(0.9238795325, -0.3826834324, 0))):
        with BuildLine():
            ThreePointArc((0, -2), (2, 0), (0, 2))
            Line((0, 2), (0, -2))
        make_face()
    revolve(axis=Axis((-2.2781745931, -5.5, 28), (0, 0, 1)), mode=Mode.SUBTRACT)


with BuildPart() as f1_13:
    add(f1_12.part)

    # F4_t89: cut F4_tool90
    add(f4_tool90.part, mode=Mode.SUBTRACT)


with BuildPart() as f4_tool96:
    # F4_s97 → F4_t98 (new body)
    with BuildSketch(Plane.XY.offset(28)):
        Polygon((-5.5, -2.2781745931), (-7.5, -2.2781745931), (-7.5, -3.1066017178), (-6.9142135624, -3.6923881554), align=None)
    extrude(amount=F4_T98_DEPTH)

    # F4_s99 → F4_t100 (revolve, cut)
    with BuildSketch(Plane(origin=(-5.5, -2.2781745931, 28), x_dir=(0.9238795325, 0.3826834324, 0), z_dir=(0.3826834324, -0.9238795325, 0))):
        with BuildLine():
            ThreePointArc((0, -2), (2, 0), (0, 2))
            Line((0, 2), (0, -2))
        make_face()
    revolve(axis=Axis((-5.5, -2.2781745931, 28), (0, 0, 1)), mode=Mode.SUBTRACT)


with BuildPart() as f1_14:
    add(f1_13.part)

    # F4_t95: cut F4_tool96
    add(f4_tool96.part, mode=Mode.SUBTRACT)


with BuildPart() as f4_tool102:
    # F4_s103 → F4_t104 (new body)
    with BuildSketch(Plane.XY.offset(28)):
        Polygon((2.2781745931, -5.5), (2.2781745931, -7.5), (3.1066017178, -7.5), (3.6923881554, -6.9142135624), align=None)
    extrude(amount=F4_T104_DEPTH)

    # F4_s105 → F4_t106 (revolve, cut)
    with BuildSketch(Plane(origin=(2.2781745931, -5.5, 28), x_dir=(-0.3826834324, 0.9238795325, 0), z_dir=(0.9238795325, 0.3826834324, 0))):
        with BuildLine():
            ThreePointArc((0, -2), (2, 0), (0, 2))
            Line((0, 2), (0, -2))
        make_face()
    revolve(axis=Axis((2.2781745931, -5.5, 28), (0, 0, 1)), mode=Mode.SUBTRACT)


with BuildPart() as f1_15:
    add(f1_14.part)

    # F4_t101: cut F4_tool102
    add(f4_tool102.part, mode=Mode.SUBTRACT)


with BuildPart() as f4_tool108:
    # F4_s109 → F4_t110 (new body)
    with BuildSketch(Plane.XY.offset(28)):
        Polygon((2.2781745931, 5.5), (2.2781745931, 7.5), (3.1066017178, 7.5), (3.6923881554, 6.9142135624), align=None)
    extrude(amount=F4_T110_DEPTH)

    # F4_s111 → F4_t112 (revolve, cut)
    with BuildSketch(Plane(origin=(2.2781745931, 5.5, 28), x_dir=(-0.3826834324, -0.9238795325, 0), z_dir=(-0.9238795325, 0.3826834324, 0))):
        with BuildLine():
            ThreePointArc((0, -2), (2, 0), (0, 2))
            Line((0, 2), (0, -2))
        make_face()
    revolve(axis=Axis((2.2781745931, 5.5, 28), (0, 0, 1)), mode=Mode.SUBTRACT)


with BuildPart() as f1_16:
    add(f1_15.part)

    # F4_t107: cut F4_tool108
    add(f4_tool108.part, mode=Mode.SUBTRACT)

    # F4_s113 → F4_t114 (revolve, cut)
    with BuildSketch(Plane.XZ):
        with BuildLine():
            ThreePointArc((5.7, 30), (4.2857864376, 29.4142135624), (3.7, 28))
            Line((3.7, 28), (3.7, 30))
            Line((3.7, 30), (5.7, 30))
        make_face()
    revolve(axis=Axis((0, 0, 30), (0, 0, 1)), mode=Mode.SUBTRACT)


solid = f1_16.part
